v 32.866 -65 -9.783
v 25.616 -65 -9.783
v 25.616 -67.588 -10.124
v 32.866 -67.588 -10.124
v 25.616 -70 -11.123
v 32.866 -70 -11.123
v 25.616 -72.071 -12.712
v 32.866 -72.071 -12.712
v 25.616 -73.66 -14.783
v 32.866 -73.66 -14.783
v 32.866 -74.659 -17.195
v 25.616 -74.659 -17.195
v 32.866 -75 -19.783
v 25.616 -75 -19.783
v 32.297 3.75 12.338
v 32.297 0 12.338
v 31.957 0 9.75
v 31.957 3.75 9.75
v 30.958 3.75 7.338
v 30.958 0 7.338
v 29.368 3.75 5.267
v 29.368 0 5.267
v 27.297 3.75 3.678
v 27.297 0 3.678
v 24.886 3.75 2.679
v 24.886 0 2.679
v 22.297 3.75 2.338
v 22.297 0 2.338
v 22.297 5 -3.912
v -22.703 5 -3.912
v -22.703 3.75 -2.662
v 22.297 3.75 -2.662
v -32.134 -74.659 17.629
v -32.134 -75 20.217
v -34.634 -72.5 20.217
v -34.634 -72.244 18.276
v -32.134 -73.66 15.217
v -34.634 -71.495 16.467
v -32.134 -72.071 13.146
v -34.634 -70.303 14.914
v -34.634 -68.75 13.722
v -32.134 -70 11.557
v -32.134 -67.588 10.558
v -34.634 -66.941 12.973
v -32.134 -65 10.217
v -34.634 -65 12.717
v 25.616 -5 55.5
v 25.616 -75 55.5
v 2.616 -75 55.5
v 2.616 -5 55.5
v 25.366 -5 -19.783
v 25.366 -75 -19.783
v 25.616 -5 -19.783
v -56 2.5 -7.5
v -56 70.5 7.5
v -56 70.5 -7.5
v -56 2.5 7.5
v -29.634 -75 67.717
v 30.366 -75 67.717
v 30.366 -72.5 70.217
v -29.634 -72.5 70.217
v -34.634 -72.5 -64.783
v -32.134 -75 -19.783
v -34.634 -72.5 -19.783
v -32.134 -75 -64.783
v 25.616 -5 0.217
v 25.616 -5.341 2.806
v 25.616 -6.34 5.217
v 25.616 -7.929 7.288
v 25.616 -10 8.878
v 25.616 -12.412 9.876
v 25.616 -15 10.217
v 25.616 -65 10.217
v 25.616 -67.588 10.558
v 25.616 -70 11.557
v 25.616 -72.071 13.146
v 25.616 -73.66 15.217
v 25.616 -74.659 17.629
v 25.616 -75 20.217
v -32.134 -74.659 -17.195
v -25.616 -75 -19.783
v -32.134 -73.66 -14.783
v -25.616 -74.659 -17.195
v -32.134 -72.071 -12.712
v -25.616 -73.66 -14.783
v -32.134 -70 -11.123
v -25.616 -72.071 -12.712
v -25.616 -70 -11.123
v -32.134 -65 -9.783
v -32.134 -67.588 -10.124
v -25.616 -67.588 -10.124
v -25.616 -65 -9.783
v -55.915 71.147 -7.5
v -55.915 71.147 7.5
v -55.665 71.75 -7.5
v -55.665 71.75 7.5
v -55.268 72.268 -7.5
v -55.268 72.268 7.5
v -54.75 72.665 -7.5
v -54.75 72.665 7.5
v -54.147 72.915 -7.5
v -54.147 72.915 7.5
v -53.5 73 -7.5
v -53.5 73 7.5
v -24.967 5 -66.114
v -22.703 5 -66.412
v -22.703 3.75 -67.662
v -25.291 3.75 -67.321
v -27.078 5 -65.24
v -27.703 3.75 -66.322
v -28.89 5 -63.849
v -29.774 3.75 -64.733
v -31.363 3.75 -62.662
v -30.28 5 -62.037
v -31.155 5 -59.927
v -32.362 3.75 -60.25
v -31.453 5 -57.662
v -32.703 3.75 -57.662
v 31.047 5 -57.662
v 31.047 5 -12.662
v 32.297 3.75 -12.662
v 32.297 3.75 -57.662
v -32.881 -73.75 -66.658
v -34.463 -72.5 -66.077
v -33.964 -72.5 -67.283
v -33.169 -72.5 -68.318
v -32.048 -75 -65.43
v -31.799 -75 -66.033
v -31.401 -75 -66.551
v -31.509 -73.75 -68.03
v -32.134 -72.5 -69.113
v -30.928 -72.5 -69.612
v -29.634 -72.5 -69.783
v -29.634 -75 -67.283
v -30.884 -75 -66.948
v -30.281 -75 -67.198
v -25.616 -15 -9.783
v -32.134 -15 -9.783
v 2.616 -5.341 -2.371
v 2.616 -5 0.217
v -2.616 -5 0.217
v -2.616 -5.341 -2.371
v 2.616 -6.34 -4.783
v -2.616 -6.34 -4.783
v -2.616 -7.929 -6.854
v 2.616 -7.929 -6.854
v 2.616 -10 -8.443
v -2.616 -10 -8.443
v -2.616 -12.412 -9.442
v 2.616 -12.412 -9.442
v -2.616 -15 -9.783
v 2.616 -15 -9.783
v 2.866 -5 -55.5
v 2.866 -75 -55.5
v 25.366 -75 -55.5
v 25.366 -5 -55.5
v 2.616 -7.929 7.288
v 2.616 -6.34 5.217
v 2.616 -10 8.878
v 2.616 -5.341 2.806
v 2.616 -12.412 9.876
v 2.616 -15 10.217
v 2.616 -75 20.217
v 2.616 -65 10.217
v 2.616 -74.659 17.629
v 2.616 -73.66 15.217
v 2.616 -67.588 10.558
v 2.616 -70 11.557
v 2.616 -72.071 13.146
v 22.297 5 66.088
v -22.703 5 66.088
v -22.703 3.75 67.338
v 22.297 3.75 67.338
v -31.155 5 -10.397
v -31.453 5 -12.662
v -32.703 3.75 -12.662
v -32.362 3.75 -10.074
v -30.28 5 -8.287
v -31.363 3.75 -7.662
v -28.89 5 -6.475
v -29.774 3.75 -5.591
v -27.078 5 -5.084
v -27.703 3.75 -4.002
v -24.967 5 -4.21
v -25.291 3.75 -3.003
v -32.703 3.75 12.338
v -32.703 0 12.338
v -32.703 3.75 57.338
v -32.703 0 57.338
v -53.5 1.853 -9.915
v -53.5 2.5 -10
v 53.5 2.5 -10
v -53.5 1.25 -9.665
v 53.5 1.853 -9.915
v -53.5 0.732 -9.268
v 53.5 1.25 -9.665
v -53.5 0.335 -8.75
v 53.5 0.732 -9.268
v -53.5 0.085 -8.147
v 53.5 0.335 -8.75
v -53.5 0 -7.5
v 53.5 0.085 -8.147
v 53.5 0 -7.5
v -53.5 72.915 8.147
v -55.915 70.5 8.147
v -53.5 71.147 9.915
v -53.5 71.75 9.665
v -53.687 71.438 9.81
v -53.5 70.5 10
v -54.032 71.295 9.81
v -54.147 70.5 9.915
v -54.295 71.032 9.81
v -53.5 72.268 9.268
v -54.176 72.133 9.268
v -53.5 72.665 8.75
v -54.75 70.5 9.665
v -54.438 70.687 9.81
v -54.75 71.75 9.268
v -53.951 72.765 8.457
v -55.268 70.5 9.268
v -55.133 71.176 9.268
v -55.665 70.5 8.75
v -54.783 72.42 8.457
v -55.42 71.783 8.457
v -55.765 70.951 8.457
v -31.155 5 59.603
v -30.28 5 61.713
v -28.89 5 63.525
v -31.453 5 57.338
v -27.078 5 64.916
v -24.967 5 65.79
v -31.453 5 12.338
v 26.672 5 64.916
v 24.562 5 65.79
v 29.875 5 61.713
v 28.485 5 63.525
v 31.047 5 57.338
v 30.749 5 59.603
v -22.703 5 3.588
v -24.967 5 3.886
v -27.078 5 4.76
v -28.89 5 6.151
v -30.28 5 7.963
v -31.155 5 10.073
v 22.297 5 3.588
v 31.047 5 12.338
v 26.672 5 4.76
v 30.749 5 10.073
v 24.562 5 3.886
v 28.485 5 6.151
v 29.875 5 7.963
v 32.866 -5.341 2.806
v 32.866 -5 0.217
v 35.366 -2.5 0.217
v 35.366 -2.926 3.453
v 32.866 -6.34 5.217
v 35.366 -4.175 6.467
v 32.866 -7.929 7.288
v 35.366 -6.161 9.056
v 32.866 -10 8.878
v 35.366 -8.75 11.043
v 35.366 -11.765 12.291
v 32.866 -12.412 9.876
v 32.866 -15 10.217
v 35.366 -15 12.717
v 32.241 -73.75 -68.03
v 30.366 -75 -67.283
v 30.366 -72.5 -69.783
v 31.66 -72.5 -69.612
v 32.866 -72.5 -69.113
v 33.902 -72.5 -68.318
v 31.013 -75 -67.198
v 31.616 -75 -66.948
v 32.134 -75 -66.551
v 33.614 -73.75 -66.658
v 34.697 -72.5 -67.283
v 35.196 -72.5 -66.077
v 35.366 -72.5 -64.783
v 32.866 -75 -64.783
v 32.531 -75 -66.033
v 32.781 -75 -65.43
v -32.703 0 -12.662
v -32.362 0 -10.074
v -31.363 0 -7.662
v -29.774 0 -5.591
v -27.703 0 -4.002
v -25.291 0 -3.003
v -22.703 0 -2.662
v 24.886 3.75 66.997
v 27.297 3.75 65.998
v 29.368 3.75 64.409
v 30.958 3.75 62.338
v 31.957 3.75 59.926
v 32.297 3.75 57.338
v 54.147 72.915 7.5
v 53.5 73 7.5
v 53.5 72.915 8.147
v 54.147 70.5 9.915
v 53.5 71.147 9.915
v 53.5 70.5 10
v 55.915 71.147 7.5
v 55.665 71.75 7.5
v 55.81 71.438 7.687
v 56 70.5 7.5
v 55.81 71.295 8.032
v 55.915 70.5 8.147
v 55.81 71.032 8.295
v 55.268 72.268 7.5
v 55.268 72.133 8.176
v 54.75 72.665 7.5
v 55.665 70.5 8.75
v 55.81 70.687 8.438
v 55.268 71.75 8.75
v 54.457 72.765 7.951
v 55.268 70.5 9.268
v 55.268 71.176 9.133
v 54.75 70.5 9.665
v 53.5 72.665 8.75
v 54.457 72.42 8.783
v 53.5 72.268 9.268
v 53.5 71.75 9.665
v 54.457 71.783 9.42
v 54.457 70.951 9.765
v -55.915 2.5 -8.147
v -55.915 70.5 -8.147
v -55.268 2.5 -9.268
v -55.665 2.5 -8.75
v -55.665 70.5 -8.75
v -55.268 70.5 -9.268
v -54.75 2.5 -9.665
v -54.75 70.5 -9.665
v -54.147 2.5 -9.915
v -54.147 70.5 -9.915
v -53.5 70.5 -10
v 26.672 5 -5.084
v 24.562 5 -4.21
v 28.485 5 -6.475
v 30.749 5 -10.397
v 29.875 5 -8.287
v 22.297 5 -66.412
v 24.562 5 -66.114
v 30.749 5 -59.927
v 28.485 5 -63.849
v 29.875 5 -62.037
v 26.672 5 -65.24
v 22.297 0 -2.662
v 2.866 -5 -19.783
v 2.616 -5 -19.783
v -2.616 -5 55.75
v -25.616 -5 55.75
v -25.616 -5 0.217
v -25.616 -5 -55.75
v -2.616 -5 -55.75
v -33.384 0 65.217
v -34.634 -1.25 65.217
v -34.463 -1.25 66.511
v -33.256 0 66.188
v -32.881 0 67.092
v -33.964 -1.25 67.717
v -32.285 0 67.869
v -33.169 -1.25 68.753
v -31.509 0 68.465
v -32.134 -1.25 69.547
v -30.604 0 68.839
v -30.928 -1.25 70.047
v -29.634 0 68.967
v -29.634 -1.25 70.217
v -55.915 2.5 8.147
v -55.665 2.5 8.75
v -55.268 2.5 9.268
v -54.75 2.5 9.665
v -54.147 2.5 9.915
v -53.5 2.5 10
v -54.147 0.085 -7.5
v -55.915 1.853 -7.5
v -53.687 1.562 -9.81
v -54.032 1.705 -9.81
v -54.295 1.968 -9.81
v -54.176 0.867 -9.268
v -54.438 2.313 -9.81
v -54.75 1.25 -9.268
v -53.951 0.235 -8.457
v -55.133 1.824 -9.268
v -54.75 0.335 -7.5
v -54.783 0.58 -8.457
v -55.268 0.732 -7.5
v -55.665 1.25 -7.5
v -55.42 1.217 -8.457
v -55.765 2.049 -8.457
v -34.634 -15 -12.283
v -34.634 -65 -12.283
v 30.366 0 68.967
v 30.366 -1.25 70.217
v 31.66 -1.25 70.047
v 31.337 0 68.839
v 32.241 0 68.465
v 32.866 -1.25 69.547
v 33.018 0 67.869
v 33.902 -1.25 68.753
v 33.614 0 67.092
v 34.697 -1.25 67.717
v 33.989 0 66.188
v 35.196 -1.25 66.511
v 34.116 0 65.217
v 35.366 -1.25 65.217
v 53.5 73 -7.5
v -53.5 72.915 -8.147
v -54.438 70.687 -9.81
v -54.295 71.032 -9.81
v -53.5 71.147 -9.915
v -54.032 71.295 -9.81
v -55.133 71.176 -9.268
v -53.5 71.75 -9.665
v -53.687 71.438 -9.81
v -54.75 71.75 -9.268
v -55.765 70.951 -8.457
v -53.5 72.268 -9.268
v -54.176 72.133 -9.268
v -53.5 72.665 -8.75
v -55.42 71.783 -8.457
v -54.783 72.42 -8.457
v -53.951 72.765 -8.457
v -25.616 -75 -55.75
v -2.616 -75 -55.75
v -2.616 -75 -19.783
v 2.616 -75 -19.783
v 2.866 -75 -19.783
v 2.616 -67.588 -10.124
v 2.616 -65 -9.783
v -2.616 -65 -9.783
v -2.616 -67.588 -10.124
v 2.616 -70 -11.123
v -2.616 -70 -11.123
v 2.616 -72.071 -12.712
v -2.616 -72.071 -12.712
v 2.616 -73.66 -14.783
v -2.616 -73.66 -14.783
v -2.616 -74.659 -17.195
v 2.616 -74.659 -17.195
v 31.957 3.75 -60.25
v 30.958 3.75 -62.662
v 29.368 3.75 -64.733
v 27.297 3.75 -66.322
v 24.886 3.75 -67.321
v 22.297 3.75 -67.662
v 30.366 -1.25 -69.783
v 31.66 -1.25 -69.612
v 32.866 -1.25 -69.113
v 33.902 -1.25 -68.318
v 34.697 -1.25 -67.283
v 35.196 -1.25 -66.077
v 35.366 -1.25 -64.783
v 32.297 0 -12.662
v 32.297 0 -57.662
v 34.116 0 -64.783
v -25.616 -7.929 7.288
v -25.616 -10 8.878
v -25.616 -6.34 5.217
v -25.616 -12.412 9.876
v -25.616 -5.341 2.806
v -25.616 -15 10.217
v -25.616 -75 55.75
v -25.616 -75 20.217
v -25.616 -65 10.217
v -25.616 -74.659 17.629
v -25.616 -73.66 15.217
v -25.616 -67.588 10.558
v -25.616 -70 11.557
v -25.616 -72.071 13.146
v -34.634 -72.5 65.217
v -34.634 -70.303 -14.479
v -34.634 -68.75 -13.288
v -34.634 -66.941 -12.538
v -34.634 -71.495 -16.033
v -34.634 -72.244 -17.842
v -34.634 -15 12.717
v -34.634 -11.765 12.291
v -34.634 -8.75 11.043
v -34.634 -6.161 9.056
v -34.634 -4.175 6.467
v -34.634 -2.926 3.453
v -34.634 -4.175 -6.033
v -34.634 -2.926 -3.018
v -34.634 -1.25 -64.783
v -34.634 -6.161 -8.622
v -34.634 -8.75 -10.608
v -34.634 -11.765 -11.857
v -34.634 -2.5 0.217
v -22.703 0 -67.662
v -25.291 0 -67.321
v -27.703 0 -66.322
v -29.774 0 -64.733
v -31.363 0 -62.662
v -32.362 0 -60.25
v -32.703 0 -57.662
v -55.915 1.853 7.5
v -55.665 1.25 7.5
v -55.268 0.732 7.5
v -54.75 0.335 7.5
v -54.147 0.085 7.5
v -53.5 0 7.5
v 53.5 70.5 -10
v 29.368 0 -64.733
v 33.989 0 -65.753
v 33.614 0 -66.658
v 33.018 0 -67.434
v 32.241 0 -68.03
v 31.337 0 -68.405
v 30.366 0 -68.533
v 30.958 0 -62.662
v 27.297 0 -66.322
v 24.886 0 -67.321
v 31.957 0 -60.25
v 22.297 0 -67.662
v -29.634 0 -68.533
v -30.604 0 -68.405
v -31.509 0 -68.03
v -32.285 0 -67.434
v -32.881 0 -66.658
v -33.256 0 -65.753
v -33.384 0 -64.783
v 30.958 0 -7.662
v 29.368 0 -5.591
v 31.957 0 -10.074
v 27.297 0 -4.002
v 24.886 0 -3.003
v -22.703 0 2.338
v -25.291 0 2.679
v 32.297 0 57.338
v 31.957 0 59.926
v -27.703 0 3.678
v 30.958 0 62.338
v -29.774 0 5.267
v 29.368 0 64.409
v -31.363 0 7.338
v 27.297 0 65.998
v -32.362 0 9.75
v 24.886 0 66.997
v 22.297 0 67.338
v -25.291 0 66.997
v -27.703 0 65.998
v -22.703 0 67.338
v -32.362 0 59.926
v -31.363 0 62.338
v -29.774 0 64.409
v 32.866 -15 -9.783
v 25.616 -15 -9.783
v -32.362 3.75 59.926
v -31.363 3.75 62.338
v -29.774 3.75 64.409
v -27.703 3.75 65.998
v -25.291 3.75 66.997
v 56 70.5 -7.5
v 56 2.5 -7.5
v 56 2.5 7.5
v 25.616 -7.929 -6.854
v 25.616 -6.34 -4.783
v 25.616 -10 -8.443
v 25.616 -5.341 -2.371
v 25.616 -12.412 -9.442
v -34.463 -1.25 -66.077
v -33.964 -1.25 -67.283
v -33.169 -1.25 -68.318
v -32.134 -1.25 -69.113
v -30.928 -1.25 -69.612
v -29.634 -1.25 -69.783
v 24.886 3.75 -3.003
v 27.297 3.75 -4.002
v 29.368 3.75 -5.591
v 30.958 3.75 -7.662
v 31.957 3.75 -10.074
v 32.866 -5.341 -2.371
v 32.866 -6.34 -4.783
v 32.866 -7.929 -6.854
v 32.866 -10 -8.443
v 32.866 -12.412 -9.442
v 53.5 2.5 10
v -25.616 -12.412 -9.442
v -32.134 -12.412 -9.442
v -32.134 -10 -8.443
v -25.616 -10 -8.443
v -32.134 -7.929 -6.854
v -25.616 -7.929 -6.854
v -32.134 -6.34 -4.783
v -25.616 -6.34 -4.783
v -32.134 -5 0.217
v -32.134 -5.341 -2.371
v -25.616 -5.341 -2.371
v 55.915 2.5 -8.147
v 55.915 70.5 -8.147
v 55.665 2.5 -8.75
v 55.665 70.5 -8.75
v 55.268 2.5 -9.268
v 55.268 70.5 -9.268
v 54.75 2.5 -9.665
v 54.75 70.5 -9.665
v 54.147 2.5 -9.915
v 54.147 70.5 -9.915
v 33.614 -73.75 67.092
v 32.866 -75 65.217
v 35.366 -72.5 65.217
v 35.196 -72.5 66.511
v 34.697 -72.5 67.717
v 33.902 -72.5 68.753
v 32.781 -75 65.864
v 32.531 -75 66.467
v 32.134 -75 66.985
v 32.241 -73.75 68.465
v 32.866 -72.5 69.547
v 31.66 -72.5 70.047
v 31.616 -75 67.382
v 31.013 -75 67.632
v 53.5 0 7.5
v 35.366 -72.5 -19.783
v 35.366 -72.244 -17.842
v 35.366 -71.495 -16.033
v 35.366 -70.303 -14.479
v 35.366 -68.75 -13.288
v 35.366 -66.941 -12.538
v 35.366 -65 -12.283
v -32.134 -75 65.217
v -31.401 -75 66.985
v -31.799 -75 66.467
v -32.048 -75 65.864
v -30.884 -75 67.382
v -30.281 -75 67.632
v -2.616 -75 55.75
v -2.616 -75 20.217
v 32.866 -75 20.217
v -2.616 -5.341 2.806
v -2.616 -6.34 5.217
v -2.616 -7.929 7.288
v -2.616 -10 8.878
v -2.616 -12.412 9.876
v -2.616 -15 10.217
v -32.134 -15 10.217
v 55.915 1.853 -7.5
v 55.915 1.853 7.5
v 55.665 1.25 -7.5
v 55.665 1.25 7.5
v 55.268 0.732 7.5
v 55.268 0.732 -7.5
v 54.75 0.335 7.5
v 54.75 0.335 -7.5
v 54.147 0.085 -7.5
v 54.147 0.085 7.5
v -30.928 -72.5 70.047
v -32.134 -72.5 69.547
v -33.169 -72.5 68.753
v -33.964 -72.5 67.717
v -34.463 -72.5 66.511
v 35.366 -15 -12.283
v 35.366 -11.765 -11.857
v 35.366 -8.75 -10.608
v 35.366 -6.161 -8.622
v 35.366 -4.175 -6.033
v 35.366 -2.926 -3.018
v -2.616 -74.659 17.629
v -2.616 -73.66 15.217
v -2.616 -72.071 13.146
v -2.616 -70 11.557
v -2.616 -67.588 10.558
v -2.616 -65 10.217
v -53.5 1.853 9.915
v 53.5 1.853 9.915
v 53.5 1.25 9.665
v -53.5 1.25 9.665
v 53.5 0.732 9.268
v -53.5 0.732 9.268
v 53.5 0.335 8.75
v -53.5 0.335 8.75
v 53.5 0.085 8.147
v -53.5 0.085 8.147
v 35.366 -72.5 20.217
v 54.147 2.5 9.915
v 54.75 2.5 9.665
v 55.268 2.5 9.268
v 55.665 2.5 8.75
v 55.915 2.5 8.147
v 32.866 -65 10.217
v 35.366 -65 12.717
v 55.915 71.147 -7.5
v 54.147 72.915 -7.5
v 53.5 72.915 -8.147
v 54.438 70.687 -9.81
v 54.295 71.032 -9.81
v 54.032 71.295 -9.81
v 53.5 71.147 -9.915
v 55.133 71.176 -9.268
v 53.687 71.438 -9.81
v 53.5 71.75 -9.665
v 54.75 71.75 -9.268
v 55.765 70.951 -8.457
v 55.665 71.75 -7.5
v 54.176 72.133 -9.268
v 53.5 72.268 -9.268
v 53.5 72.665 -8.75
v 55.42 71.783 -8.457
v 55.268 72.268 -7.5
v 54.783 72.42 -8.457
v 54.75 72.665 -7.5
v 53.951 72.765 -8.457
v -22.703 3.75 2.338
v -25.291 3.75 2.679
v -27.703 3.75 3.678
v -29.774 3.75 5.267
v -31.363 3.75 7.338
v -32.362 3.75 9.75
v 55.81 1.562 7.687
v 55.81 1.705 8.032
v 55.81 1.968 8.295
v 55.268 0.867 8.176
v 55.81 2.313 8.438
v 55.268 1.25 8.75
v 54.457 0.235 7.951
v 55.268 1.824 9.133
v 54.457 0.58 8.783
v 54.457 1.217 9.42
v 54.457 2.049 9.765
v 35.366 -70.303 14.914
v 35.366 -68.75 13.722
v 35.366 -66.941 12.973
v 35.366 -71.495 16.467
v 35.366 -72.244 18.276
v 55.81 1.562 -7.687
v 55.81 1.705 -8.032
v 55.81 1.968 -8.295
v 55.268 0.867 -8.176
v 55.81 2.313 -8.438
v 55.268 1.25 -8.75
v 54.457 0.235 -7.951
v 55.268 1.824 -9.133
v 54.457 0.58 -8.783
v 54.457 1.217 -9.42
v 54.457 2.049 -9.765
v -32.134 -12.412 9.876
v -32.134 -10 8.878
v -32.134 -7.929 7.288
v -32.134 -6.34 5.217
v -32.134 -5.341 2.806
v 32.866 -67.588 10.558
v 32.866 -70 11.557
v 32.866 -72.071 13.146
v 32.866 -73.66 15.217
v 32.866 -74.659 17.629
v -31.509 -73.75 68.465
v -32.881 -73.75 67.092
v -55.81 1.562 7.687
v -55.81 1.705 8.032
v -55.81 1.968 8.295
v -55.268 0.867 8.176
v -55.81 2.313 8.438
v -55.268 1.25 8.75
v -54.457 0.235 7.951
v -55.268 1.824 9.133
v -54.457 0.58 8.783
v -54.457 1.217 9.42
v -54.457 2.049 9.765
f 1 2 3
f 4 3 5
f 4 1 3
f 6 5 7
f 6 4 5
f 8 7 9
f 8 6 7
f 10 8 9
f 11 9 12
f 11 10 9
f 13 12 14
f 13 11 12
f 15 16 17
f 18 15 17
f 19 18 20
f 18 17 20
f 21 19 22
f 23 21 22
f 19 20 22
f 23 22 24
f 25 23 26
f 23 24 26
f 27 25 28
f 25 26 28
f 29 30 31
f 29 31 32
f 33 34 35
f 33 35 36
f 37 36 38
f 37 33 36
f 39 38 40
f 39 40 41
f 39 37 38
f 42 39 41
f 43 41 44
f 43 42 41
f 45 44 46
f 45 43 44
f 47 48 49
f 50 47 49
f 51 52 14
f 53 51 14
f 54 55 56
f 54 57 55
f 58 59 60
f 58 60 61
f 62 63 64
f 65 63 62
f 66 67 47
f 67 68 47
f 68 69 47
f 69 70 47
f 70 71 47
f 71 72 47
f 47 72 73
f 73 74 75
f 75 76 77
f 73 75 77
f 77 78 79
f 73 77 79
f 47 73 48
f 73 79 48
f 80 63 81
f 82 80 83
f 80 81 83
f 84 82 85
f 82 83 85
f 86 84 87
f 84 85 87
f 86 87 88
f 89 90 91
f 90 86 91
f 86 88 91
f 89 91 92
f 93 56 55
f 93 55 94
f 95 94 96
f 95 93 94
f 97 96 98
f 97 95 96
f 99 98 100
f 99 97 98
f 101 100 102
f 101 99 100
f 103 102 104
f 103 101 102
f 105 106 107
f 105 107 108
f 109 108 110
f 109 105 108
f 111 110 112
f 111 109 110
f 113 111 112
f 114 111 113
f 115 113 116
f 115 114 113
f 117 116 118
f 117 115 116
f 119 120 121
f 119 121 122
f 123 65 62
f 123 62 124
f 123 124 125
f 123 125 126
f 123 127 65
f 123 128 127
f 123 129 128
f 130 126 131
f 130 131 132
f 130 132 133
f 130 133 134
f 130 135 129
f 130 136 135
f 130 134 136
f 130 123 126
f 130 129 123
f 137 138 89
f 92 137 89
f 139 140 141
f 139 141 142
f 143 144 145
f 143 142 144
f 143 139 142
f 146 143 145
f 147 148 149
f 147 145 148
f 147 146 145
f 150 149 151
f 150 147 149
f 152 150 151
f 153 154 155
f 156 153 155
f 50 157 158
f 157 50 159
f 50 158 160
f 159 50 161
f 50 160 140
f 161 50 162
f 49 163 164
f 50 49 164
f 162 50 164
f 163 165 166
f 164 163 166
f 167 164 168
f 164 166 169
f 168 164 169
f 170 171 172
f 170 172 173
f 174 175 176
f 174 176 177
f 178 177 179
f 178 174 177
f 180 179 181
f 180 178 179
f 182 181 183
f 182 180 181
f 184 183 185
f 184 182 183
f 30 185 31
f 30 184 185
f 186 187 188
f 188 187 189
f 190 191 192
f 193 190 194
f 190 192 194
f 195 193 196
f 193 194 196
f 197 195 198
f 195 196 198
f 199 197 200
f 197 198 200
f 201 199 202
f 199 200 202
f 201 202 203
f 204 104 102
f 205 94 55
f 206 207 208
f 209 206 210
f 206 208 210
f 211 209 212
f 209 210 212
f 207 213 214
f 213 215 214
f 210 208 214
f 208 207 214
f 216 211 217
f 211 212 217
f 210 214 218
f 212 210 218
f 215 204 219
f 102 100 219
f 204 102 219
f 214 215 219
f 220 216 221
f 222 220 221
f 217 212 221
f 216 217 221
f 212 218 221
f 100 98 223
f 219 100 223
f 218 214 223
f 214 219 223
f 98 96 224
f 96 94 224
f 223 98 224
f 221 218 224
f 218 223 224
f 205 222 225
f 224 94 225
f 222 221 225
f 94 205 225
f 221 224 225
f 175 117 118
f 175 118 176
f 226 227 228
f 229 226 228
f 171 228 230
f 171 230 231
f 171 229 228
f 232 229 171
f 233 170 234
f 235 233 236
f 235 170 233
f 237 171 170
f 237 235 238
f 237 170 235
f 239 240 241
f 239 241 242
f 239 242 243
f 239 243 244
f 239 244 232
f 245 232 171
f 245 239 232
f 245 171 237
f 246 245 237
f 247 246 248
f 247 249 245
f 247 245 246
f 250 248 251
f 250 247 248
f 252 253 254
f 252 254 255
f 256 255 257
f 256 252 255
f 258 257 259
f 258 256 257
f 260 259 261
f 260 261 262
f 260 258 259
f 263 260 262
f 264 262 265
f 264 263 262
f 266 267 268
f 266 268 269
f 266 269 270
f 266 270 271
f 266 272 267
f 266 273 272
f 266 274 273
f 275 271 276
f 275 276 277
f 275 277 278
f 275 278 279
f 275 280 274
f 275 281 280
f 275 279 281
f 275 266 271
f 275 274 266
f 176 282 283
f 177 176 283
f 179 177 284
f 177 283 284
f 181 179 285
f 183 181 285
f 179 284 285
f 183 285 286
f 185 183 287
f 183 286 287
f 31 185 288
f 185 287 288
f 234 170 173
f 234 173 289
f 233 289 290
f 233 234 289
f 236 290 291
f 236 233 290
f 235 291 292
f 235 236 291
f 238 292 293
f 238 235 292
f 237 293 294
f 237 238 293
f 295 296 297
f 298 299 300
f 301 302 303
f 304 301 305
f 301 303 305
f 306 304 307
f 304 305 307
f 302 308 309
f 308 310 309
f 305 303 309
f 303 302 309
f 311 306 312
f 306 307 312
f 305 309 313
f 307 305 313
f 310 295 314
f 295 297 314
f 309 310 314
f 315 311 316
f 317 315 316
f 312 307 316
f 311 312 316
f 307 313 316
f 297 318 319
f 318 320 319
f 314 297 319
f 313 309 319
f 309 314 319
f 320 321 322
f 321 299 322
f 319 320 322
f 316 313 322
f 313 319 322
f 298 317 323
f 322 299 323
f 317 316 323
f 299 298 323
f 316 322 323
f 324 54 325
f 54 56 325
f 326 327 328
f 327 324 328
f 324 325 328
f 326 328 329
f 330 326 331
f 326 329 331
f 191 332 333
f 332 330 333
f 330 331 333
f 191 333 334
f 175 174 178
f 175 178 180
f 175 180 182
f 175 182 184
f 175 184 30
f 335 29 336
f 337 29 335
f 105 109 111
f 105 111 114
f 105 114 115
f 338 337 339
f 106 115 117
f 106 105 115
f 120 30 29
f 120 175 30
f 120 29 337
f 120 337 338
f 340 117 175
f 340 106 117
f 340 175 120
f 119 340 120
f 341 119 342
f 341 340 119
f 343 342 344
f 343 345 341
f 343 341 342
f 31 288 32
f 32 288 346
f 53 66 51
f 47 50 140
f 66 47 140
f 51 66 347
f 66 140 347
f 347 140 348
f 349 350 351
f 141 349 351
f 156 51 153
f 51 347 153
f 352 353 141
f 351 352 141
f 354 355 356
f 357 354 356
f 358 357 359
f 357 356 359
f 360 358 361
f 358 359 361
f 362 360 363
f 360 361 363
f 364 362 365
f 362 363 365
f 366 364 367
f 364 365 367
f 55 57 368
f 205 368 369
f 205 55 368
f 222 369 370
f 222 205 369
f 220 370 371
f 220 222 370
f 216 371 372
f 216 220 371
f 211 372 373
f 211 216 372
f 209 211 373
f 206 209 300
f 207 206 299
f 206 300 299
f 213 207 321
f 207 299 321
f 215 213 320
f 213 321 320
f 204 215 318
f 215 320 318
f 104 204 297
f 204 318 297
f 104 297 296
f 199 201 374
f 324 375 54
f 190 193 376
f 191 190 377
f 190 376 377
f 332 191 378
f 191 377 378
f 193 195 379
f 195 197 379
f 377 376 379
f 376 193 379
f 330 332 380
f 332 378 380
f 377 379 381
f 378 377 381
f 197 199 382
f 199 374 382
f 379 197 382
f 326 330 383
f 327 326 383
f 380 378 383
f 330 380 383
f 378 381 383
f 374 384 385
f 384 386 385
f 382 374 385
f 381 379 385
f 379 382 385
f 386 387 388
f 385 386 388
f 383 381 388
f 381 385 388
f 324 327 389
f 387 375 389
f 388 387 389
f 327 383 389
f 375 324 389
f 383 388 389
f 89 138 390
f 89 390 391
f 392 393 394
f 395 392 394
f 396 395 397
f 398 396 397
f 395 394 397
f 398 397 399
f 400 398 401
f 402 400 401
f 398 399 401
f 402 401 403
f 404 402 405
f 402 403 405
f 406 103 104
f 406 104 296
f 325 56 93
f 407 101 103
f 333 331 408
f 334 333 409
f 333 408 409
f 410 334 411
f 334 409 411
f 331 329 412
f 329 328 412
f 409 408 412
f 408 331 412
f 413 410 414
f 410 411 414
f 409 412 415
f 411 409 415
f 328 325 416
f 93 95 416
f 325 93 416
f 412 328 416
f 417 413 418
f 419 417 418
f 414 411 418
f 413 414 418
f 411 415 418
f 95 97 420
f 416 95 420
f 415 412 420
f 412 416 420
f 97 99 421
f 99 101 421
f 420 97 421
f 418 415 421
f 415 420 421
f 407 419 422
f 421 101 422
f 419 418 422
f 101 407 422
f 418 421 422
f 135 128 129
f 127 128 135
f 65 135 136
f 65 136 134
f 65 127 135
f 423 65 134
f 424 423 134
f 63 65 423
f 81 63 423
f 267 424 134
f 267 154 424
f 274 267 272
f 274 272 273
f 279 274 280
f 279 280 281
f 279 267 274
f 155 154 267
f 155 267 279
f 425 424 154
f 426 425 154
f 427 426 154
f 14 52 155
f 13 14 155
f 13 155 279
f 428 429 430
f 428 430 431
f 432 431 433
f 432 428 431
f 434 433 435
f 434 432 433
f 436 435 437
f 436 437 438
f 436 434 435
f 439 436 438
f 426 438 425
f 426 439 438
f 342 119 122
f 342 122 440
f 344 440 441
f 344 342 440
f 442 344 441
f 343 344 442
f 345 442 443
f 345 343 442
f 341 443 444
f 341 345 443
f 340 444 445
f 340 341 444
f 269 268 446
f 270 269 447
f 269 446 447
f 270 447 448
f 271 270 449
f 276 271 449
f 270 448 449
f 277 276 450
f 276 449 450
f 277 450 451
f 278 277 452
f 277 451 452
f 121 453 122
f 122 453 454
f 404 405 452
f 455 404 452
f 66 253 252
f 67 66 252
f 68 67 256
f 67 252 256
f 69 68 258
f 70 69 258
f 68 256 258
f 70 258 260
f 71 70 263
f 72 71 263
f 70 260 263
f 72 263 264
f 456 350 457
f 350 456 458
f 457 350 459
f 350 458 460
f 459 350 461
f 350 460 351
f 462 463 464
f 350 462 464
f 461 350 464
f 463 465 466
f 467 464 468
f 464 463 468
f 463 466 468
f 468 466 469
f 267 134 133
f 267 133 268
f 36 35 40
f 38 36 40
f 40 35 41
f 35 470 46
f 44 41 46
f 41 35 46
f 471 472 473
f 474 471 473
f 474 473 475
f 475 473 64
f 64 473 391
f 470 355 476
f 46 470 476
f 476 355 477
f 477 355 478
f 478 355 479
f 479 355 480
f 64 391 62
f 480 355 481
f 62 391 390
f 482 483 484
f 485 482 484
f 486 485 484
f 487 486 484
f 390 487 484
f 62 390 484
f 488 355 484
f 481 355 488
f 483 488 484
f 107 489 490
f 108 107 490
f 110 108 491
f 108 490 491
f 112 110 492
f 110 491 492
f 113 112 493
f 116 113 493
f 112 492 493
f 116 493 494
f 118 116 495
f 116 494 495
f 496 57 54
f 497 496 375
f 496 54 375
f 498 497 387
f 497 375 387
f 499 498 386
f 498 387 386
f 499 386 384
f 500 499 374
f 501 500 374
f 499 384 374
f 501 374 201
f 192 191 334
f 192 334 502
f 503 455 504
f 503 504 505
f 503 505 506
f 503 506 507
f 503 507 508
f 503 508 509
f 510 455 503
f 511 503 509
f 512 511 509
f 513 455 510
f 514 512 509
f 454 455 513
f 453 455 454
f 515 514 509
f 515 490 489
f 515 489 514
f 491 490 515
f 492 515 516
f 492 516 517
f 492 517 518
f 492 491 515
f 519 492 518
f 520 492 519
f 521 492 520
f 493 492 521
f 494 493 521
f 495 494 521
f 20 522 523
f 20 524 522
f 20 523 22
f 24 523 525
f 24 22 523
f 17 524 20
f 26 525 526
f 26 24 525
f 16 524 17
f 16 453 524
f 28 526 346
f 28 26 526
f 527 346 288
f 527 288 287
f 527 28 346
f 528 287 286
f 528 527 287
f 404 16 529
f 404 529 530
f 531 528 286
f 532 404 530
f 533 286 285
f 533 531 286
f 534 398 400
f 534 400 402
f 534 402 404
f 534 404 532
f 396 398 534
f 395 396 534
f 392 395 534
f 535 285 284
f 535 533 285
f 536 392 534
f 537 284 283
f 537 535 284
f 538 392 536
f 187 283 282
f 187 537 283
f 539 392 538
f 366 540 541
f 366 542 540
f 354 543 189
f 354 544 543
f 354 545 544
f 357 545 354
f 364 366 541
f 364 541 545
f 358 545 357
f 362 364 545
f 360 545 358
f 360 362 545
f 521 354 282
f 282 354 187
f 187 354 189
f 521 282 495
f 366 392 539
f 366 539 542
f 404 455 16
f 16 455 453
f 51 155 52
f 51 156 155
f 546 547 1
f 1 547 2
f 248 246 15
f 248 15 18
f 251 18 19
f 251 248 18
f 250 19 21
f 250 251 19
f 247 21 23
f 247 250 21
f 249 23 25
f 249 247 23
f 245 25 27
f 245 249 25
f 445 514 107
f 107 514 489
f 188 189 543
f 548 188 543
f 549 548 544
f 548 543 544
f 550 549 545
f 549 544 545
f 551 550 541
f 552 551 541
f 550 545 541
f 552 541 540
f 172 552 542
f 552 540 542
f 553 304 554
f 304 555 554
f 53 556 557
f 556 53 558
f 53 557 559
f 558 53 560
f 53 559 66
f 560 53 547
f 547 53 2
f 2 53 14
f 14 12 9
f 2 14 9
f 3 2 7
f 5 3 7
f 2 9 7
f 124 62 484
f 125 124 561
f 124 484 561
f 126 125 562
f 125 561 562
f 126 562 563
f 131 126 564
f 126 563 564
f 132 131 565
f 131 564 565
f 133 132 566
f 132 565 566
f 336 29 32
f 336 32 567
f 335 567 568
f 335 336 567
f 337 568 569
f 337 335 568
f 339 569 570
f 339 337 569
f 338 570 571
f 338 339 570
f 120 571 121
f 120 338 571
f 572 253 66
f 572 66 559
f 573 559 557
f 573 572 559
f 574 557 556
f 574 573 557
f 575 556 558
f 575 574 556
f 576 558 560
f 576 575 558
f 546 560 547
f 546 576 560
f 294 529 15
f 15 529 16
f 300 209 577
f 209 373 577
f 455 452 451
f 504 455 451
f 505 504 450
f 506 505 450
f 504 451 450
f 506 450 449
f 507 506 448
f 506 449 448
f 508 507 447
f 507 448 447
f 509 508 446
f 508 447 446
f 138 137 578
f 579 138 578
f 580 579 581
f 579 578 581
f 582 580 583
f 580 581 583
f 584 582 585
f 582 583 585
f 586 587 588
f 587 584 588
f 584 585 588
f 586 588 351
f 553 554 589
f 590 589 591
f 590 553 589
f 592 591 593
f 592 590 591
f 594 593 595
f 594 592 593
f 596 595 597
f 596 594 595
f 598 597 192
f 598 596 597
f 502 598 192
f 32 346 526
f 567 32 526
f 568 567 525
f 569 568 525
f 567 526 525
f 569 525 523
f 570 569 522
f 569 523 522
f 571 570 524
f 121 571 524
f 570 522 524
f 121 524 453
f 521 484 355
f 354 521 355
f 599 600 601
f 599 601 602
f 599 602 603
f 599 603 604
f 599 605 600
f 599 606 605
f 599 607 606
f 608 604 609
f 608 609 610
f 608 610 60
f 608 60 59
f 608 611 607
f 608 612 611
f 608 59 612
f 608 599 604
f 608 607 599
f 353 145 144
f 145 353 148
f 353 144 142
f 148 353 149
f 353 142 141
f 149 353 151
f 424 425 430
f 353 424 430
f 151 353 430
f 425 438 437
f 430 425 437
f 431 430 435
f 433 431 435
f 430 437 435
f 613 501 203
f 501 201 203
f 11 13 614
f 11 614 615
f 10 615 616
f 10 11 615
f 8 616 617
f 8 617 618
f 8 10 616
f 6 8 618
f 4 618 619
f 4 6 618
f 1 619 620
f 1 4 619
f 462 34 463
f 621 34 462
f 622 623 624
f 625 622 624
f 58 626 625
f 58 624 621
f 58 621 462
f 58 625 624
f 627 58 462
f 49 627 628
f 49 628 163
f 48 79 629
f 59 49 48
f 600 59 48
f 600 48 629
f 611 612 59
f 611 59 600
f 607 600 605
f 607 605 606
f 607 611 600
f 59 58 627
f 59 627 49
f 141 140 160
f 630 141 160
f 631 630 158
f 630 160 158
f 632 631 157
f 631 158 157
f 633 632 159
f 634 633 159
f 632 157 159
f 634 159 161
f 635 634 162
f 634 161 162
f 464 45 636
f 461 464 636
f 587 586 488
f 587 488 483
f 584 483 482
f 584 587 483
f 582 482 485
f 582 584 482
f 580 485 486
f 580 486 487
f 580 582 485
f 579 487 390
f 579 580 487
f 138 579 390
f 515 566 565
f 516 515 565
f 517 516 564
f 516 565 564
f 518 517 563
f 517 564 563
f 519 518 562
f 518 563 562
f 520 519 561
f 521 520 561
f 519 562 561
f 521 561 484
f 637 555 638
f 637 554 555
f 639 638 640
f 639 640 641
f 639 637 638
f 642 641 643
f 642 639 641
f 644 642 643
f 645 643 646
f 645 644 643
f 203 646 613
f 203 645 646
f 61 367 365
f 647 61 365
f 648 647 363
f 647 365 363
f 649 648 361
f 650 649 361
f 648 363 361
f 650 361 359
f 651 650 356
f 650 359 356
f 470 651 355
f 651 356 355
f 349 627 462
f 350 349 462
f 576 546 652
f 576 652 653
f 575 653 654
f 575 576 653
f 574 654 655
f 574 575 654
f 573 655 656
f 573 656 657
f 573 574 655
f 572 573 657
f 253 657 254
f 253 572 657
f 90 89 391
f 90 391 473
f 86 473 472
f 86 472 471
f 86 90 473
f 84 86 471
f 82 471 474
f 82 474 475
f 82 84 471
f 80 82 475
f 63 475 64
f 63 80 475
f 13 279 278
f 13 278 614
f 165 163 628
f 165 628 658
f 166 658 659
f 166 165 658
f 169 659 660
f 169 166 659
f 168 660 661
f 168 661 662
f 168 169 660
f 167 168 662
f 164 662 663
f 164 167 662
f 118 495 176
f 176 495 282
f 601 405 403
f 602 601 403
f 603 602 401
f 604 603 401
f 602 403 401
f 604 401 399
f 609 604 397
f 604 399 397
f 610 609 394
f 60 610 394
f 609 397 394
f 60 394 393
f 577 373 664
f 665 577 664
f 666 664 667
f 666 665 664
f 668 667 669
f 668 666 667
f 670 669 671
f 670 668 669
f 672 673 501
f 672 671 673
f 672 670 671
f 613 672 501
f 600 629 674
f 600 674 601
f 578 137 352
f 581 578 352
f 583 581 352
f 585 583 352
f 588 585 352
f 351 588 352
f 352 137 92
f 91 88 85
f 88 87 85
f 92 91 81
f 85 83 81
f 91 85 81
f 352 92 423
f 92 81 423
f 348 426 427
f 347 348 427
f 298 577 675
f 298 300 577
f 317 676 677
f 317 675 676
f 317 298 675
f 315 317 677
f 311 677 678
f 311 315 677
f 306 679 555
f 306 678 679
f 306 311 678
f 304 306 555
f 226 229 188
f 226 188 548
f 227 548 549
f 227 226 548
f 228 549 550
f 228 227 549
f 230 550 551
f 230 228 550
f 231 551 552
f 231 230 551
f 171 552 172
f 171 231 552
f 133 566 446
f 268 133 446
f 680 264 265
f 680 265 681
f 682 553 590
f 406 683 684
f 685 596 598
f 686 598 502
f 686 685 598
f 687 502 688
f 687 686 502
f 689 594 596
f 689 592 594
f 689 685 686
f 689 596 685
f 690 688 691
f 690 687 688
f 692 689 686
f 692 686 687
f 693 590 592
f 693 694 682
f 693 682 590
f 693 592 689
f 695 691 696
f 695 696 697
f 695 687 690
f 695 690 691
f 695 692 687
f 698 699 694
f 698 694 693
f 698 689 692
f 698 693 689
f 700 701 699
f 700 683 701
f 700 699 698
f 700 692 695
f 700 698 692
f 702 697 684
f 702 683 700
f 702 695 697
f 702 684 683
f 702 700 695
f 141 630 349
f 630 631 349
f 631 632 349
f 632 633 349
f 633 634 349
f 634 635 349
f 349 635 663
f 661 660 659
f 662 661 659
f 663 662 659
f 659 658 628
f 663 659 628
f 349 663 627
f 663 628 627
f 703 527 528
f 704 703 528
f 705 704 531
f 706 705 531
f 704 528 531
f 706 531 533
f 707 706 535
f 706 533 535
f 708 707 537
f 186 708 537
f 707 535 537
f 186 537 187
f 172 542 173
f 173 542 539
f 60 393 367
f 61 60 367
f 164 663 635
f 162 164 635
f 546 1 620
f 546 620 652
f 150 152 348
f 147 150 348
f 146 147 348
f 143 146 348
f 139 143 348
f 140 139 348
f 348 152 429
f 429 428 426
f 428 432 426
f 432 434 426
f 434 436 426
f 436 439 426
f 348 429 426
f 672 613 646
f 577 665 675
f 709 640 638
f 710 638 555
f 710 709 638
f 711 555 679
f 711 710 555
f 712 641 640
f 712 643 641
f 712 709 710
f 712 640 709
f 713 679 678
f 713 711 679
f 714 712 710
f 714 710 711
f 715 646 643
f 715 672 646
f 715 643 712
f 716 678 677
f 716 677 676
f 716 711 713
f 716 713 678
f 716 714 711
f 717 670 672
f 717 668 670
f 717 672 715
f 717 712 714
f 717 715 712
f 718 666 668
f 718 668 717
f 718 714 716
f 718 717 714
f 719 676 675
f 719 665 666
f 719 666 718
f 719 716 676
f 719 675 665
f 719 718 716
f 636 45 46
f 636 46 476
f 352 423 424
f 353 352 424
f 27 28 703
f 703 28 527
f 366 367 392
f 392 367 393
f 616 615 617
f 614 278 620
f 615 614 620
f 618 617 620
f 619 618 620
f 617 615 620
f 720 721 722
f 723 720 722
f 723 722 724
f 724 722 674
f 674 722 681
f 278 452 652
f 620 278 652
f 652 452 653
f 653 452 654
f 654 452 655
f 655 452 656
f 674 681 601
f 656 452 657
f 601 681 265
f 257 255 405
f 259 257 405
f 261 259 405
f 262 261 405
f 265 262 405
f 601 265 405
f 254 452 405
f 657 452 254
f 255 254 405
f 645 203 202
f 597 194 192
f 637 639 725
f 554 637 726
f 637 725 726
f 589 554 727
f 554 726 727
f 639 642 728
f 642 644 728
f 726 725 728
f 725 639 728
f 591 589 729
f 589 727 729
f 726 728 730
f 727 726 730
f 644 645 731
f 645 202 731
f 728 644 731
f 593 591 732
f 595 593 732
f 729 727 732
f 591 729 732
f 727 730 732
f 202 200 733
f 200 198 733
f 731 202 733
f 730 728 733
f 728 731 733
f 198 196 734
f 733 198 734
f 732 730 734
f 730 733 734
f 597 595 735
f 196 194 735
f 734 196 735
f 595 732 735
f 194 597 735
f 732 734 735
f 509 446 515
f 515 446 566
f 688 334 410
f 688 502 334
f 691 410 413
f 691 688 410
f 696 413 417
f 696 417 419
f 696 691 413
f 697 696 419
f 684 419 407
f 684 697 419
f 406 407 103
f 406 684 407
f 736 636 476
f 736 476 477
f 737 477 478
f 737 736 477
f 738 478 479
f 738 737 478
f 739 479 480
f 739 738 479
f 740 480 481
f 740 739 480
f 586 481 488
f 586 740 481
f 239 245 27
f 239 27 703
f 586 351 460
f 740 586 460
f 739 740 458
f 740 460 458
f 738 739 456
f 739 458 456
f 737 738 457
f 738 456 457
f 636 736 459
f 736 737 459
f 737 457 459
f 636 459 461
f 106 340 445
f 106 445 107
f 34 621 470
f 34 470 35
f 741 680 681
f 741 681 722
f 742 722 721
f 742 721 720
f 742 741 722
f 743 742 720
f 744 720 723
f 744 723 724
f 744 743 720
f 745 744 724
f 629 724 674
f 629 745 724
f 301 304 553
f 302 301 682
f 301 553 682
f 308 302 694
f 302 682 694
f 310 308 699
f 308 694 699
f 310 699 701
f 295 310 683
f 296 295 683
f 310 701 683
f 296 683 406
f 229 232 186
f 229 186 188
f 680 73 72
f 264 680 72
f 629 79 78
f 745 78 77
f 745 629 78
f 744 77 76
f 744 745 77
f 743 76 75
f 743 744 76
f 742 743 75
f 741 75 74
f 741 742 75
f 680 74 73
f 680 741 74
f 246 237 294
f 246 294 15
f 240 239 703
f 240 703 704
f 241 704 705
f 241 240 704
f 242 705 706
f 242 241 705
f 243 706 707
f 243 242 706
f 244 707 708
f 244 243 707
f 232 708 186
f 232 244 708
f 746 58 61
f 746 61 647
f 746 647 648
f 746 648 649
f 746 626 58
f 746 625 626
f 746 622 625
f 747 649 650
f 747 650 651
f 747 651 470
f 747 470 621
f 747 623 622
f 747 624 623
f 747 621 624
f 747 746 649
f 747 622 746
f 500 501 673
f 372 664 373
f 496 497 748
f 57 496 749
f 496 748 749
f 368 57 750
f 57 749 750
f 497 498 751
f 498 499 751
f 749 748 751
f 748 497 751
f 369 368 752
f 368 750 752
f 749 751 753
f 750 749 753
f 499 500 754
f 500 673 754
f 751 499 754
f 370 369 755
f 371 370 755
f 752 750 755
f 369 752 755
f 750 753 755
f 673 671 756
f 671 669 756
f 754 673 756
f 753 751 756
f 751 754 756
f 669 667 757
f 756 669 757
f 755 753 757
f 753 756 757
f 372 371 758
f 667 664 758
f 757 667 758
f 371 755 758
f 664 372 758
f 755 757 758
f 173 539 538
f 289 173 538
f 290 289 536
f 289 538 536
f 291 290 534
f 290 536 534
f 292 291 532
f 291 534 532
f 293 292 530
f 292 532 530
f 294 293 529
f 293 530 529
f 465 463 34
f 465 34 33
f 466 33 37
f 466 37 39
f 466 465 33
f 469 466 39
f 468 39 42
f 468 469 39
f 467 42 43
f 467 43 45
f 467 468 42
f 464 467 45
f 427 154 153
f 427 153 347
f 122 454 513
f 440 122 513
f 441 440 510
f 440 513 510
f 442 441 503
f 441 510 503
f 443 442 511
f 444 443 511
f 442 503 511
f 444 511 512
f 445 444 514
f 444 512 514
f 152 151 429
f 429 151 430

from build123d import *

# Parameters (mm, degrees)
SKETCH1_W             = 112
SKETCH1_H             = 20
BOSS_EXTRUDE1_DEPTH   = 73
FILLET1_R             = 2.5
BOSS_EXTRUDE5_DEPTH   = 5
BOSS_EXTRUDE5_2_DEPTH = 5
BOSS_EXTRUDE9_DEPTH   = 5
SKETCH10_W            = 22.5
SKETCH10_H            = 111
BOSS_EXTRUDE10_DEPTH  = 70
CUT_EXTRUDE1_DEPTH    = 70
FILLET14_R            = 10
FILLET15_R            = 10
CHAMFER1_SIZE         = 2.5
CHAMFER2_SIZE         = 1.25
CUT_EXTRUDE2_DEPTH    = 70
CUT_EXTRUDE3_DEPTH    = 70
CHAMFER3_SIZE         = 1.25


with BuildPart() as part:
    # Sketch1 → Boss-Extrude1 (new body)
    with BuildSketch(Plane(origin=(0, 0, 0), x_dir=(1, 0, 0), z_dir=(0, 1, 0))):
        Rectangle(SKETCH1_W, SKETCH1_H)
    extrude(amount=BOSS_EXTRUDE1_DEPTH)

    # Fillet1
    fillet1_edges = [part.edges().sort_by_distance(p)[0] for p in [
        (-56, 73, 0),
        (0, 73, 10),
        (56, 73, 0),
        (0, 0, 10),
        (-56, 0, 0),
        (0, 0, -10),
        (56, 0, 0),
        (56, 36.5, 10),
        (-56, 36.5, 10),
        (-56, 36.5, -10),
        (56, 36.5, -10),
        (0, 73, -10),
    ]]
    fillet(fillet1_edges, radius=FILLET1_R)


with BuildPart() as body_2:
    # Sketch7 → Boss-Extrude5 (new body)
    with BuildSketch(Plane(origin=(0, 0, 0), x_dir=(1, 0, 0), z_dir=(0, 1, 0))):
        with BuildLine():
            Line((32.297324425, -57.33785954), (32.297324425, -12.33785954))
            ThreePointArc((32.297324425, -12.33785954), (29.368392237, -5.266791728), (22.297324425, -2.33785954))
            Line((22.297324425, -2.33785954), (-22.702675575, -2.33785954))
            ThreePointArc((-22.702675575, -2.33785954), (-29.773743387, -5.266791728), (-32.702675575, -12.33785954))
            Line((-32.702675575, -12.33785954), (-32.702675575, -57.33785954))
            ThreePointArc((-32.702675575, -57.33785954), (-29.773743387, -64.408927352), (-22.702675575, -67.33785954))
            Line((-22.702675575, -67.33785954), (22.297324425, -67.33785954))
            ThreePointArc((22.297324425, -67.33785954), (29.368392237, -64.408927352), (32.297324425, -57.33785954))
        make_face()
    extrude(amount=BOSS_EXTRUDE5_DEPTH)


with BuildPart() as body_3:
    # Sketch7 → Boss-Extrude5 2 (new body)
    with BuildSketch(Plane(origin=(0, 0, 0), x_dir=(1, 0, 0), z_dir=(0, 1, 0))):
        with BuildLine():
            Line((-32.702675575, 57.66214046), (-32.702675575, 12.66214046))
            ThreePointArc((-32.702675575, 12.66214046), (-29.773743387, 5.591072648), (-22.702675575, 2.66214046))
            Line((-22.702675575, 2.66214046), (22.297324425, 2.66214046))
            ThreePointArc((22.297324425, 2.66214046), (29.368392237, 5.591072648), (32.297324425, 12.66214046))
            Line((32.297324425, 12.66214046), (32.297324425, 57.66214046))
            ThreePointArc((32.297324425, 57.66214046), (29.368392237, 64.733208272), (22.297324425, 67.66214046))
            Line((22.297324425, 67.66214046), (-22.702675575, 67.66214046))
            ThreePointArc((-22.702675575, 67.66214046), (-29.773743387, 64.733208272), (-32.702675575, 57.66214046))
        make_face()
    extrude(amount=BOSS_EXTRUDE5_2_DEPTH)


    add(body_2.part)  # Boss-Extrude9 merges body 2
    # Sketch9 → Boss-Extrude9 (add)
    with BuildSketch(Plane.XZ):
        with BuildLine():
            Line((-29.633608546, 70.217237559), (30.366391454, 70.217237559))
            ThreePointArc((30.366391454, 70.217237559), (33.90192536, 68.752771465), (35.366391454, 65.217237559))
            Line((35.366391454, 65.217237559), (35.366391454, -64.782762441))
            ThreePointArc((35.366391454, -64.782762441), (33.90192536, -68.318296346), (30.366391454, -69.782762441))
            Line((30.366391454, -69.782762441), (-29.633608546, -69.782762441))
            ThreePointArc((-29.633608546, -69.782762441), (-33.169142452, -68.318296346), (-34.633608546, -64.782762441))
            Line((-34.633608546, -64.782762441), (-34.633608546, 65.217237559))
            ThreePointArc((-34.633608546, 65.217237559), (-33.169142452, 68.752771465), (-29.633608546, 70.217237559))
        make_face()
    extrude(amount=BOSS_EXTRUDE9_DEPTH)

    # Sketch10 → Boss-Extrude10 (add)
    with BuildSketch(Plane.XZ.offset(5)):
        with BuildLine():
            Line((-34.633608546, 65.217237559), (-34.633608546, -64.782762441))
            ThreePointArc((-34.633608546, -64.782762441), (-33.169142452, -68.318296346), (-29.633608546, -69.782762441))
            Line((-29.633608546, -69.782762441), (30.366391454, -69.782762441))
            ThreePointArc((30.366391454, -69.782762441), (33.90192536, -68.318296346), (35.366391454, -64.782762441))
            Line((35.366391454, -64.782762441), (35.366391454, 65.217237559))
            ThreePointArc((35.366391454, 65.217237559), (33.90192536, 68.752771465), (30.366391454, 70.217237559))
            Line((30.366391454, 70.217237559), (-29.633608546, 70.217237559))
            ThreePointArc((-29.633608546, 70.217237559), (-33.169142452, 68.752771465), (-34.633608546, 65.217237559))
        make_face()
        with Locations((14.116391454, 0)):
            Rectangle(SKETCH10_W, SKETCH10_H, mode=Mode.SUBTRACT)
        with Locations((-14.116391454, 0)):
            Rectangle(SKETCH10_W, SKETCH10_H, mode=Mode.SUBTRACT)
    extrude(amount=BOSS_EXTRUDE10_DEPTH)

    # Sketch11 → Cut-Extrude1 (cut)
    with BuildSketch(Plane.ZY.offset(34.633608546)):
        Polygon((0.217237559, -5), (-9.782762441, -5), (-9.782762441, -75), (10.217237559, -75), (10.217237559, -5), align=None)
    extrude(amount=-CUT_EXTRUDE1_DEPTH, mode=Mode.SUBTRACT)

    # Fillet14
    fillet14_edges = [body_3.edges().sort_by_distance(p)[0] for p in [
        (-30, -5, 10.217237559),
        (-30, -5, -9.782762441),
        (0, -5, -9.782762441),
        (0, -5, 10.217237559),
        (30.366391454, -5, 10.217237559),
        (30.366391454, -5, -9.782762441),
    ]]
    fillet(fillet14_edges, radius=FILLET14_R - 0.0001)  # a hair under: the kernel refuses the full size

    # Fillet15
    fillet15_edges = [body_3.edges().sort_by_distance(p)[0] for p in [
        (0, -75, 10.217237559),
        (30.366391454, -75, 10.217237559),
        (-30, -75, 10.217237559),
        (0, -75, -9.782762441),
        (30.366391454, -75, -9.782762441),
        (-30, -75, -9.782762441),
    ]]
    fillet(fillet15_edges, radius=FILLET15_R)

    # Chamfer1
    chamfer1_edges = [body_3.edges().sort_by_distance(p)[0] for p in [
        (-34.633608546, -39.99995, -9.782762441),
        (35.366391454, -39.99995, -9.782762441),
        (-34.633608546, -7.928902899, 7.288334661),
        (-34.633608546, -7.928902899, -6.853859542),
        (35.366391454, -7.928902899, 7.288334661),
        (35.366391454, -7.928902899, -6.853859542),
        (35.366391454, -39.99995, 10.217237559),
        (35.366391454, -75, 42.717237559),
        (35.366391454, -72.071067812, -12.711694629),
        (35.366391454, -72.071067812, 13.146169748),
        (-34.633608546, -39.99995, 10.217237559),
        (-34.633608546, -75, -42.282762441),
        (-34.633608546, -72.071067812, -12.711694629),
        (-34.633608546, -72.071067812, 13.146169748),
        (-34.633608546, -75, 42.717237559),
        (-33.169142452, -75, -68.318296346),
        (0.366391454, -75, -69.782762441),
        (33.90192536, -75, -68.318296346),
        (35.366391454, -75, -42.282762441),
        (33.90192536, -75, 68.752771465),
        (0.366391454, -75, 70.217237559),
        (-33.169142452, -75, 68.752771465),
    ]]
    chamfer(chamfer1_edges, length=CHAMFER1_SIZE)

    # Chamfer2
    chamfer2_edges = [body_3.edges().sort_by_distance(p)[0] for p in [
        (-29.773743387, 5, -5.591072648),
        (-0.202675575, 5, -2.66214046),
        (29.368392237, 5, -5.591072648),
        (32.297324425, 5, -35.16214046),
        (29.368392237, 5, -64.733208272),
        (-0.202675575, 5, -67.66214046),
        (-29.773743387, 5, -64.733208272),
        (-32.702675575, 5, -35.16214046),
        (32.297324425, 5, 34.83785954),
        (29.368392237, 5, 5.266791728),
        (-0.202675575, 5, 2.33785954),
        (-29.773743387, 5, 5.266791728),
        (-32.702675575, 5, 34.83785954),
        (-29.773743387, 5, 64.408927352),
        (-0.202675575, 5, 67.33785954),
        (29.368392237, 5, 64.408927352),
    ]]
    chamfer(chamfer2_edges, length=CHAMFER2_SIZE)

    # Sketch12 → Cut-Extrude2 (cut)
    with BuildSketch(Plane.XZ.offset(75)):
        Polygon((-2.616391454, -19.782762441), (-2.616391454, -9.782762441), (-2.616391454, 0.217237559), (-2.616391454, 55.75), (-25.616391454, 55.75), (-25.616391454, 0.217237559), (-25.616391454, -55.75), (-2.616391454, -55.75), align=None)
    extrude(amount=-CUT_EXTRUDE2_DEPTH, mode=Mode.SUBTRACT)

    # Sketch13 → Cut-Extrude3 (cut)
    with BuildSketch(Plane.XZ.offset(75)):
        Polygon((25.616391454, 55.5), (2.616391454, 55.5), (2.616391454, 0.217237559), (2.616391454, -9.782762441), (2.616391454, -19.782762441), (2.866391454, -19.782762441), (2.866391454, -55.5), (25.366391454, -55.5), (25.366391454, -19.782762441), (25.616391454, -19.782762441), (25.616391454, -9.782762441), (25.616391454, 0.217237559), (25.616391454, 10.217237559), (25.616391454, 20.217237559), align=None)
    extrude(amount=-CUT_EXTRUDE3_DEPTH, mode=Mode.SUBTRACT)

    # Chamfer3
    chamfer3_edges = [body_3.edges().sort_by_distance(p)[0] for p in [
        (-33.169142452, 0, -68.318296346),
        (0.366391454, 0, -69.782762441),
        (33.90192536, 0, -68.318296346),
        (35.366391454, 0, 0.217237559),
        (33.90192536, 0, 68.752771465),
        (0.366391454, 0, 70.217237559),
        (-33.169142452, 0, 68.752771465),
        (-34.633608546, 0, 0.217237559),
    ]]
    chamfer(chamfer3_edges, length=CHAMFER3_SIZE)


solid = Compound([part.part, body_3.part])
